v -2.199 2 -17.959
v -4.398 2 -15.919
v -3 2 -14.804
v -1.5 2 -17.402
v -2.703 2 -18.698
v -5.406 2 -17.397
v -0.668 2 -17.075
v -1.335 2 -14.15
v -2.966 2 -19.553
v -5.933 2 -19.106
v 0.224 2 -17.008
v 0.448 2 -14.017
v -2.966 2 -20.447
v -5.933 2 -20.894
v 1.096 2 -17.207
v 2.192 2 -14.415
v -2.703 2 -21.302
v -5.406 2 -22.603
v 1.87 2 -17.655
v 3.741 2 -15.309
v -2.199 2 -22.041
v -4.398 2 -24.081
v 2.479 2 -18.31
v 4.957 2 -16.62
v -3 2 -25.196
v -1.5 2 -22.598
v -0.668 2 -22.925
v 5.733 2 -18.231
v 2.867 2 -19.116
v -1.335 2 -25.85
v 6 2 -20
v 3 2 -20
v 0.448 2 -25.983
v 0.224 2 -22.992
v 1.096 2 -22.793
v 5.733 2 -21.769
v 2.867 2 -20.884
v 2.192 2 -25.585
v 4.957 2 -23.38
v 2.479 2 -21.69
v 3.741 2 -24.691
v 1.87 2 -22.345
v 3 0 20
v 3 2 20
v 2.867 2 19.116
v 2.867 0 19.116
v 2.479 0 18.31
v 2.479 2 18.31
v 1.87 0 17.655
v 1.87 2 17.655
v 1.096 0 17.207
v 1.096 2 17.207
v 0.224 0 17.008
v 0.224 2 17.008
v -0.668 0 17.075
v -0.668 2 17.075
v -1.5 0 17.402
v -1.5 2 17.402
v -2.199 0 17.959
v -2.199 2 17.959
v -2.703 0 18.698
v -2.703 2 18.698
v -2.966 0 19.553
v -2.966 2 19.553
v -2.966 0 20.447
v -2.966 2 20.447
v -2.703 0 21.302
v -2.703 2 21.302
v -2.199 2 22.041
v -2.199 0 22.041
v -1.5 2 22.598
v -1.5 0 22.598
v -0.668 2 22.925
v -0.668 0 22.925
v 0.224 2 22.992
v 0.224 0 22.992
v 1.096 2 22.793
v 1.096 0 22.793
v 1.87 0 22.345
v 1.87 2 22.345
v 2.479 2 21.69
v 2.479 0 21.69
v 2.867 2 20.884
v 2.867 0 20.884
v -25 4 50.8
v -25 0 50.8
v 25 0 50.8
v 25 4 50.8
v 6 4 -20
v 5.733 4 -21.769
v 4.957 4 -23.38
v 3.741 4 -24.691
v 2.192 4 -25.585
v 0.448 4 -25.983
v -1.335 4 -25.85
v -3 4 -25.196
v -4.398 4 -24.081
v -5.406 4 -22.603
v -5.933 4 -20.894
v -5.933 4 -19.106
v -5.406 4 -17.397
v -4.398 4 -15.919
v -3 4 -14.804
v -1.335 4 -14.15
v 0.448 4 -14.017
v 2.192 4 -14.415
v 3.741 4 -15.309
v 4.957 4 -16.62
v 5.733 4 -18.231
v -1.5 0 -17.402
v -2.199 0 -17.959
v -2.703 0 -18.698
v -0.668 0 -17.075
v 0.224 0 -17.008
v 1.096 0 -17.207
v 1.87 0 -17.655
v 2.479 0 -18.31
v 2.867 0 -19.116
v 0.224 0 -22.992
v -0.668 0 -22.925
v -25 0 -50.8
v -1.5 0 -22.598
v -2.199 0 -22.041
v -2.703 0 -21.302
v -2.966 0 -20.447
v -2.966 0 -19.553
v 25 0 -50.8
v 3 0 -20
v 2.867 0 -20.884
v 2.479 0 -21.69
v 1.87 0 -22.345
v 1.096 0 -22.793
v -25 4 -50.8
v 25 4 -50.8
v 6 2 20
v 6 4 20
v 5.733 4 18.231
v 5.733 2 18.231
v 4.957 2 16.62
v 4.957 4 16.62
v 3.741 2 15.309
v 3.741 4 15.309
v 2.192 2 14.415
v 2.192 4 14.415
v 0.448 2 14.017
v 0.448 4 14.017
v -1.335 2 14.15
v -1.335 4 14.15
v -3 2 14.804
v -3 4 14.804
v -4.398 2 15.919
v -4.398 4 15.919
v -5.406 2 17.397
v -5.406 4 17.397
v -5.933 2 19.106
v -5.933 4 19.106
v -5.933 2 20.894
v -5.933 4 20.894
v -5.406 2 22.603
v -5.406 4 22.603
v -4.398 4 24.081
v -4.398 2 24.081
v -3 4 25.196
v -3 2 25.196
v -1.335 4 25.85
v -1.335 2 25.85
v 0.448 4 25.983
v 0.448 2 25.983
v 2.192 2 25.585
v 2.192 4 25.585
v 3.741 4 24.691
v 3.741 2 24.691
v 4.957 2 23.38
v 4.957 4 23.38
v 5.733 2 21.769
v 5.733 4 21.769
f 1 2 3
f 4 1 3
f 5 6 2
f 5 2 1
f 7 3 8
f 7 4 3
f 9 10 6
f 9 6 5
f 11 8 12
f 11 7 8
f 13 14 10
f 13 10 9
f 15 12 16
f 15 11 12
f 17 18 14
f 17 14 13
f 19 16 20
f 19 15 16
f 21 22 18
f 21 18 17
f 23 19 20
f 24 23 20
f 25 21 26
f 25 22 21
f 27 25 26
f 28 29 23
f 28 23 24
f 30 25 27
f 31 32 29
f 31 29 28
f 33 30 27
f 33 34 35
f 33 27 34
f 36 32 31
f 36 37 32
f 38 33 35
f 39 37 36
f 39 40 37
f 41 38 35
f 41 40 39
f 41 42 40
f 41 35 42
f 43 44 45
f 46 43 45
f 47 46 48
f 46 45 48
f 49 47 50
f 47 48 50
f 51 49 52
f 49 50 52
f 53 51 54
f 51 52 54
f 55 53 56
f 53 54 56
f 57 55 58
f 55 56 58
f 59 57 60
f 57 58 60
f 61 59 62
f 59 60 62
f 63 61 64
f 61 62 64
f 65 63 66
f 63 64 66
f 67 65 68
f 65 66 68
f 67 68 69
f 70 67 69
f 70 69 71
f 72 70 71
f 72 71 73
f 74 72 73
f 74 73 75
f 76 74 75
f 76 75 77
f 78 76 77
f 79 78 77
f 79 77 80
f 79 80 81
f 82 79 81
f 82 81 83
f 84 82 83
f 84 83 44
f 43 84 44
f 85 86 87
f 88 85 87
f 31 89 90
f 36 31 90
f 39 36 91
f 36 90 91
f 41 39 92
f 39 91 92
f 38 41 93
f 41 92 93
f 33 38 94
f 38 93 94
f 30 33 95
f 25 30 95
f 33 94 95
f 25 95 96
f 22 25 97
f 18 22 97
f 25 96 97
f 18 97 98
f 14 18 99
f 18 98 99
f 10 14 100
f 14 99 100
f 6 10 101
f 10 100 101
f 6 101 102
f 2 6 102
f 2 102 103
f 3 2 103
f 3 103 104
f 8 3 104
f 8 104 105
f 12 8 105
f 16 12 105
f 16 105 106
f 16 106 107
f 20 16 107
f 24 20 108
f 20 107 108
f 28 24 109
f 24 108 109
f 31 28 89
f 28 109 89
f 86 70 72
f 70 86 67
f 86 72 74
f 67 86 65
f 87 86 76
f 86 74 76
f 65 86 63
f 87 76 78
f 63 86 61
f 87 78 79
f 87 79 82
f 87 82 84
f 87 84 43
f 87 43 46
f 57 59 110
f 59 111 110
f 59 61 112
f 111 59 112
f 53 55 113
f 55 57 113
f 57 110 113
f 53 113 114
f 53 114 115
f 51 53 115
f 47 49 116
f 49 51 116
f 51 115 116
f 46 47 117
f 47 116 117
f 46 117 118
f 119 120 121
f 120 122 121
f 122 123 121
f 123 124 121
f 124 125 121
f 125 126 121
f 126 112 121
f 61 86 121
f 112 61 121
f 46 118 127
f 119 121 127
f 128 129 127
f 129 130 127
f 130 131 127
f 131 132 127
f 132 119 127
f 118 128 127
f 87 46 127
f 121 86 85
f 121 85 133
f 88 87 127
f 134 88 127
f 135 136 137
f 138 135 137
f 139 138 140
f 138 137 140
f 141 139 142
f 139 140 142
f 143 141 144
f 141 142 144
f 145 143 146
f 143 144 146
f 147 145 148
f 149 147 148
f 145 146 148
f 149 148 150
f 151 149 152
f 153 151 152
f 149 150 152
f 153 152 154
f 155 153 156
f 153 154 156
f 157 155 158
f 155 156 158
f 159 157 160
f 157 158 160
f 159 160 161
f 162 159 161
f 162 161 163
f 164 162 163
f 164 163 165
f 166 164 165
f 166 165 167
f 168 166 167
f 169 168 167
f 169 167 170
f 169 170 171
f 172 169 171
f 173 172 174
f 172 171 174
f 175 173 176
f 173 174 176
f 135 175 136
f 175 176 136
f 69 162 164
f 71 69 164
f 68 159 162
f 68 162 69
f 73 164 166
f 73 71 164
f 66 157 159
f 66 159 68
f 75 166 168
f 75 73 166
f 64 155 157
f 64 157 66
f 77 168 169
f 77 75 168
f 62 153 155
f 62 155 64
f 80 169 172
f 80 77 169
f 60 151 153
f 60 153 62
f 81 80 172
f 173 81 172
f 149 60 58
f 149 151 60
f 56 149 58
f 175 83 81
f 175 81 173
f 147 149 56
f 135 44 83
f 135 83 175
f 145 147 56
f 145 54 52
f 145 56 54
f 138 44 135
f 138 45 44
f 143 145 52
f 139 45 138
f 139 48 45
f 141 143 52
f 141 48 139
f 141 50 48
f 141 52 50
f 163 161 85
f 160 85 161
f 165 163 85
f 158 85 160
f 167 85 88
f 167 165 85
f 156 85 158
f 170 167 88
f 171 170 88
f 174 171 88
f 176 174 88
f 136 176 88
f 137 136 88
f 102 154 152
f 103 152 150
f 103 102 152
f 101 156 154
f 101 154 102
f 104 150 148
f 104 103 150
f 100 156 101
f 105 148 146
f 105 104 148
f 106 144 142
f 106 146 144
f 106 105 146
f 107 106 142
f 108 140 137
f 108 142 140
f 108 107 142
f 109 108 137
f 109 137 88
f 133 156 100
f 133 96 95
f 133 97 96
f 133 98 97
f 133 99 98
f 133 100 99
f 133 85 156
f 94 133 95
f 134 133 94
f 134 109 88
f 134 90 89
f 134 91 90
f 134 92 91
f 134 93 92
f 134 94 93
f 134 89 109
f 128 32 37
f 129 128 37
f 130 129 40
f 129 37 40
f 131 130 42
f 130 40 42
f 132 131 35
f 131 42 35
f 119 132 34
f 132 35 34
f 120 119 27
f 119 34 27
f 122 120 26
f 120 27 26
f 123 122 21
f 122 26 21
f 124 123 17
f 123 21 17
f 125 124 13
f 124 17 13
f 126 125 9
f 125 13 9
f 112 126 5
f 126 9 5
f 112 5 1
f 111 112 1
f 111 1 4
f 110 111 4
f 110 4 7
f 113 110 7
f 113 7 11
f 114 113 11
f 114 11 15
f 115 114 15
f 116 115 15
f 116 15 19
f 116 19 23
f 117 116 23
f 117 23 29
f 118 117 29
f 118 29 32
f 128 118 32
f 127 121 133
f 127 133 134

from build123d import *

# Parameters (mm, degrees)
SKETCH1_W           = 50
SKETCH1_H           = 101.6
BOSS_EXTRUDE1_DEPTH = 4
SKETCH2_R           = 3
CUT_EXTRUDE1_DEPTH  = 10
SKETCH3_R           = 6
CUT_EXTRUDE2_DEPTH  = 2


with BuildPart() as part:
    # Sketch1 → Boss-Extrude1 (new body)
    with BuildSketch(Plane(origin=(0, 0, 0), x_dir=(1, 0, 0), z_dir=(0, 1, 0))):
        Rectangle(SKETCH1_W, SKETCH1_H)
    extrude(amount=BOSS_EXTRUDE1_DEPTH)

    # Sketch2 → Cut-Extrude1 (cut)
    with BuildSketch(Plane(origin=(0, 4, 0), x_dir=(1, 0, 0), z_dir=(0, 1, 0))):
        with Locations((0, 20)):
            Circle(SKETCH2_R)
        with Locations((0, -20)):
            Circle(SKETCH2_R)
    extrude(amount=-CUT_EXTRUDE1_DEPTH, mode=Mode.SUBTRACT)

    # Sketch3 → Cut-Extrude2 (cut)
    with BuildSketch(Plane(origin=(0, 4, 0), x_dir=(1, 0, 0), z_dir=(0, 1, 0))):
        with Locations((0, 20)):
            Circle(SKETCH3_R)
        with Locations((0, -20)):
            Circle(SKETCH3_R)
    extrude(amount=-CUT_EXTRUDE2_DEPTH, mode=Mode.SUBTRACT)


solid = part.part
